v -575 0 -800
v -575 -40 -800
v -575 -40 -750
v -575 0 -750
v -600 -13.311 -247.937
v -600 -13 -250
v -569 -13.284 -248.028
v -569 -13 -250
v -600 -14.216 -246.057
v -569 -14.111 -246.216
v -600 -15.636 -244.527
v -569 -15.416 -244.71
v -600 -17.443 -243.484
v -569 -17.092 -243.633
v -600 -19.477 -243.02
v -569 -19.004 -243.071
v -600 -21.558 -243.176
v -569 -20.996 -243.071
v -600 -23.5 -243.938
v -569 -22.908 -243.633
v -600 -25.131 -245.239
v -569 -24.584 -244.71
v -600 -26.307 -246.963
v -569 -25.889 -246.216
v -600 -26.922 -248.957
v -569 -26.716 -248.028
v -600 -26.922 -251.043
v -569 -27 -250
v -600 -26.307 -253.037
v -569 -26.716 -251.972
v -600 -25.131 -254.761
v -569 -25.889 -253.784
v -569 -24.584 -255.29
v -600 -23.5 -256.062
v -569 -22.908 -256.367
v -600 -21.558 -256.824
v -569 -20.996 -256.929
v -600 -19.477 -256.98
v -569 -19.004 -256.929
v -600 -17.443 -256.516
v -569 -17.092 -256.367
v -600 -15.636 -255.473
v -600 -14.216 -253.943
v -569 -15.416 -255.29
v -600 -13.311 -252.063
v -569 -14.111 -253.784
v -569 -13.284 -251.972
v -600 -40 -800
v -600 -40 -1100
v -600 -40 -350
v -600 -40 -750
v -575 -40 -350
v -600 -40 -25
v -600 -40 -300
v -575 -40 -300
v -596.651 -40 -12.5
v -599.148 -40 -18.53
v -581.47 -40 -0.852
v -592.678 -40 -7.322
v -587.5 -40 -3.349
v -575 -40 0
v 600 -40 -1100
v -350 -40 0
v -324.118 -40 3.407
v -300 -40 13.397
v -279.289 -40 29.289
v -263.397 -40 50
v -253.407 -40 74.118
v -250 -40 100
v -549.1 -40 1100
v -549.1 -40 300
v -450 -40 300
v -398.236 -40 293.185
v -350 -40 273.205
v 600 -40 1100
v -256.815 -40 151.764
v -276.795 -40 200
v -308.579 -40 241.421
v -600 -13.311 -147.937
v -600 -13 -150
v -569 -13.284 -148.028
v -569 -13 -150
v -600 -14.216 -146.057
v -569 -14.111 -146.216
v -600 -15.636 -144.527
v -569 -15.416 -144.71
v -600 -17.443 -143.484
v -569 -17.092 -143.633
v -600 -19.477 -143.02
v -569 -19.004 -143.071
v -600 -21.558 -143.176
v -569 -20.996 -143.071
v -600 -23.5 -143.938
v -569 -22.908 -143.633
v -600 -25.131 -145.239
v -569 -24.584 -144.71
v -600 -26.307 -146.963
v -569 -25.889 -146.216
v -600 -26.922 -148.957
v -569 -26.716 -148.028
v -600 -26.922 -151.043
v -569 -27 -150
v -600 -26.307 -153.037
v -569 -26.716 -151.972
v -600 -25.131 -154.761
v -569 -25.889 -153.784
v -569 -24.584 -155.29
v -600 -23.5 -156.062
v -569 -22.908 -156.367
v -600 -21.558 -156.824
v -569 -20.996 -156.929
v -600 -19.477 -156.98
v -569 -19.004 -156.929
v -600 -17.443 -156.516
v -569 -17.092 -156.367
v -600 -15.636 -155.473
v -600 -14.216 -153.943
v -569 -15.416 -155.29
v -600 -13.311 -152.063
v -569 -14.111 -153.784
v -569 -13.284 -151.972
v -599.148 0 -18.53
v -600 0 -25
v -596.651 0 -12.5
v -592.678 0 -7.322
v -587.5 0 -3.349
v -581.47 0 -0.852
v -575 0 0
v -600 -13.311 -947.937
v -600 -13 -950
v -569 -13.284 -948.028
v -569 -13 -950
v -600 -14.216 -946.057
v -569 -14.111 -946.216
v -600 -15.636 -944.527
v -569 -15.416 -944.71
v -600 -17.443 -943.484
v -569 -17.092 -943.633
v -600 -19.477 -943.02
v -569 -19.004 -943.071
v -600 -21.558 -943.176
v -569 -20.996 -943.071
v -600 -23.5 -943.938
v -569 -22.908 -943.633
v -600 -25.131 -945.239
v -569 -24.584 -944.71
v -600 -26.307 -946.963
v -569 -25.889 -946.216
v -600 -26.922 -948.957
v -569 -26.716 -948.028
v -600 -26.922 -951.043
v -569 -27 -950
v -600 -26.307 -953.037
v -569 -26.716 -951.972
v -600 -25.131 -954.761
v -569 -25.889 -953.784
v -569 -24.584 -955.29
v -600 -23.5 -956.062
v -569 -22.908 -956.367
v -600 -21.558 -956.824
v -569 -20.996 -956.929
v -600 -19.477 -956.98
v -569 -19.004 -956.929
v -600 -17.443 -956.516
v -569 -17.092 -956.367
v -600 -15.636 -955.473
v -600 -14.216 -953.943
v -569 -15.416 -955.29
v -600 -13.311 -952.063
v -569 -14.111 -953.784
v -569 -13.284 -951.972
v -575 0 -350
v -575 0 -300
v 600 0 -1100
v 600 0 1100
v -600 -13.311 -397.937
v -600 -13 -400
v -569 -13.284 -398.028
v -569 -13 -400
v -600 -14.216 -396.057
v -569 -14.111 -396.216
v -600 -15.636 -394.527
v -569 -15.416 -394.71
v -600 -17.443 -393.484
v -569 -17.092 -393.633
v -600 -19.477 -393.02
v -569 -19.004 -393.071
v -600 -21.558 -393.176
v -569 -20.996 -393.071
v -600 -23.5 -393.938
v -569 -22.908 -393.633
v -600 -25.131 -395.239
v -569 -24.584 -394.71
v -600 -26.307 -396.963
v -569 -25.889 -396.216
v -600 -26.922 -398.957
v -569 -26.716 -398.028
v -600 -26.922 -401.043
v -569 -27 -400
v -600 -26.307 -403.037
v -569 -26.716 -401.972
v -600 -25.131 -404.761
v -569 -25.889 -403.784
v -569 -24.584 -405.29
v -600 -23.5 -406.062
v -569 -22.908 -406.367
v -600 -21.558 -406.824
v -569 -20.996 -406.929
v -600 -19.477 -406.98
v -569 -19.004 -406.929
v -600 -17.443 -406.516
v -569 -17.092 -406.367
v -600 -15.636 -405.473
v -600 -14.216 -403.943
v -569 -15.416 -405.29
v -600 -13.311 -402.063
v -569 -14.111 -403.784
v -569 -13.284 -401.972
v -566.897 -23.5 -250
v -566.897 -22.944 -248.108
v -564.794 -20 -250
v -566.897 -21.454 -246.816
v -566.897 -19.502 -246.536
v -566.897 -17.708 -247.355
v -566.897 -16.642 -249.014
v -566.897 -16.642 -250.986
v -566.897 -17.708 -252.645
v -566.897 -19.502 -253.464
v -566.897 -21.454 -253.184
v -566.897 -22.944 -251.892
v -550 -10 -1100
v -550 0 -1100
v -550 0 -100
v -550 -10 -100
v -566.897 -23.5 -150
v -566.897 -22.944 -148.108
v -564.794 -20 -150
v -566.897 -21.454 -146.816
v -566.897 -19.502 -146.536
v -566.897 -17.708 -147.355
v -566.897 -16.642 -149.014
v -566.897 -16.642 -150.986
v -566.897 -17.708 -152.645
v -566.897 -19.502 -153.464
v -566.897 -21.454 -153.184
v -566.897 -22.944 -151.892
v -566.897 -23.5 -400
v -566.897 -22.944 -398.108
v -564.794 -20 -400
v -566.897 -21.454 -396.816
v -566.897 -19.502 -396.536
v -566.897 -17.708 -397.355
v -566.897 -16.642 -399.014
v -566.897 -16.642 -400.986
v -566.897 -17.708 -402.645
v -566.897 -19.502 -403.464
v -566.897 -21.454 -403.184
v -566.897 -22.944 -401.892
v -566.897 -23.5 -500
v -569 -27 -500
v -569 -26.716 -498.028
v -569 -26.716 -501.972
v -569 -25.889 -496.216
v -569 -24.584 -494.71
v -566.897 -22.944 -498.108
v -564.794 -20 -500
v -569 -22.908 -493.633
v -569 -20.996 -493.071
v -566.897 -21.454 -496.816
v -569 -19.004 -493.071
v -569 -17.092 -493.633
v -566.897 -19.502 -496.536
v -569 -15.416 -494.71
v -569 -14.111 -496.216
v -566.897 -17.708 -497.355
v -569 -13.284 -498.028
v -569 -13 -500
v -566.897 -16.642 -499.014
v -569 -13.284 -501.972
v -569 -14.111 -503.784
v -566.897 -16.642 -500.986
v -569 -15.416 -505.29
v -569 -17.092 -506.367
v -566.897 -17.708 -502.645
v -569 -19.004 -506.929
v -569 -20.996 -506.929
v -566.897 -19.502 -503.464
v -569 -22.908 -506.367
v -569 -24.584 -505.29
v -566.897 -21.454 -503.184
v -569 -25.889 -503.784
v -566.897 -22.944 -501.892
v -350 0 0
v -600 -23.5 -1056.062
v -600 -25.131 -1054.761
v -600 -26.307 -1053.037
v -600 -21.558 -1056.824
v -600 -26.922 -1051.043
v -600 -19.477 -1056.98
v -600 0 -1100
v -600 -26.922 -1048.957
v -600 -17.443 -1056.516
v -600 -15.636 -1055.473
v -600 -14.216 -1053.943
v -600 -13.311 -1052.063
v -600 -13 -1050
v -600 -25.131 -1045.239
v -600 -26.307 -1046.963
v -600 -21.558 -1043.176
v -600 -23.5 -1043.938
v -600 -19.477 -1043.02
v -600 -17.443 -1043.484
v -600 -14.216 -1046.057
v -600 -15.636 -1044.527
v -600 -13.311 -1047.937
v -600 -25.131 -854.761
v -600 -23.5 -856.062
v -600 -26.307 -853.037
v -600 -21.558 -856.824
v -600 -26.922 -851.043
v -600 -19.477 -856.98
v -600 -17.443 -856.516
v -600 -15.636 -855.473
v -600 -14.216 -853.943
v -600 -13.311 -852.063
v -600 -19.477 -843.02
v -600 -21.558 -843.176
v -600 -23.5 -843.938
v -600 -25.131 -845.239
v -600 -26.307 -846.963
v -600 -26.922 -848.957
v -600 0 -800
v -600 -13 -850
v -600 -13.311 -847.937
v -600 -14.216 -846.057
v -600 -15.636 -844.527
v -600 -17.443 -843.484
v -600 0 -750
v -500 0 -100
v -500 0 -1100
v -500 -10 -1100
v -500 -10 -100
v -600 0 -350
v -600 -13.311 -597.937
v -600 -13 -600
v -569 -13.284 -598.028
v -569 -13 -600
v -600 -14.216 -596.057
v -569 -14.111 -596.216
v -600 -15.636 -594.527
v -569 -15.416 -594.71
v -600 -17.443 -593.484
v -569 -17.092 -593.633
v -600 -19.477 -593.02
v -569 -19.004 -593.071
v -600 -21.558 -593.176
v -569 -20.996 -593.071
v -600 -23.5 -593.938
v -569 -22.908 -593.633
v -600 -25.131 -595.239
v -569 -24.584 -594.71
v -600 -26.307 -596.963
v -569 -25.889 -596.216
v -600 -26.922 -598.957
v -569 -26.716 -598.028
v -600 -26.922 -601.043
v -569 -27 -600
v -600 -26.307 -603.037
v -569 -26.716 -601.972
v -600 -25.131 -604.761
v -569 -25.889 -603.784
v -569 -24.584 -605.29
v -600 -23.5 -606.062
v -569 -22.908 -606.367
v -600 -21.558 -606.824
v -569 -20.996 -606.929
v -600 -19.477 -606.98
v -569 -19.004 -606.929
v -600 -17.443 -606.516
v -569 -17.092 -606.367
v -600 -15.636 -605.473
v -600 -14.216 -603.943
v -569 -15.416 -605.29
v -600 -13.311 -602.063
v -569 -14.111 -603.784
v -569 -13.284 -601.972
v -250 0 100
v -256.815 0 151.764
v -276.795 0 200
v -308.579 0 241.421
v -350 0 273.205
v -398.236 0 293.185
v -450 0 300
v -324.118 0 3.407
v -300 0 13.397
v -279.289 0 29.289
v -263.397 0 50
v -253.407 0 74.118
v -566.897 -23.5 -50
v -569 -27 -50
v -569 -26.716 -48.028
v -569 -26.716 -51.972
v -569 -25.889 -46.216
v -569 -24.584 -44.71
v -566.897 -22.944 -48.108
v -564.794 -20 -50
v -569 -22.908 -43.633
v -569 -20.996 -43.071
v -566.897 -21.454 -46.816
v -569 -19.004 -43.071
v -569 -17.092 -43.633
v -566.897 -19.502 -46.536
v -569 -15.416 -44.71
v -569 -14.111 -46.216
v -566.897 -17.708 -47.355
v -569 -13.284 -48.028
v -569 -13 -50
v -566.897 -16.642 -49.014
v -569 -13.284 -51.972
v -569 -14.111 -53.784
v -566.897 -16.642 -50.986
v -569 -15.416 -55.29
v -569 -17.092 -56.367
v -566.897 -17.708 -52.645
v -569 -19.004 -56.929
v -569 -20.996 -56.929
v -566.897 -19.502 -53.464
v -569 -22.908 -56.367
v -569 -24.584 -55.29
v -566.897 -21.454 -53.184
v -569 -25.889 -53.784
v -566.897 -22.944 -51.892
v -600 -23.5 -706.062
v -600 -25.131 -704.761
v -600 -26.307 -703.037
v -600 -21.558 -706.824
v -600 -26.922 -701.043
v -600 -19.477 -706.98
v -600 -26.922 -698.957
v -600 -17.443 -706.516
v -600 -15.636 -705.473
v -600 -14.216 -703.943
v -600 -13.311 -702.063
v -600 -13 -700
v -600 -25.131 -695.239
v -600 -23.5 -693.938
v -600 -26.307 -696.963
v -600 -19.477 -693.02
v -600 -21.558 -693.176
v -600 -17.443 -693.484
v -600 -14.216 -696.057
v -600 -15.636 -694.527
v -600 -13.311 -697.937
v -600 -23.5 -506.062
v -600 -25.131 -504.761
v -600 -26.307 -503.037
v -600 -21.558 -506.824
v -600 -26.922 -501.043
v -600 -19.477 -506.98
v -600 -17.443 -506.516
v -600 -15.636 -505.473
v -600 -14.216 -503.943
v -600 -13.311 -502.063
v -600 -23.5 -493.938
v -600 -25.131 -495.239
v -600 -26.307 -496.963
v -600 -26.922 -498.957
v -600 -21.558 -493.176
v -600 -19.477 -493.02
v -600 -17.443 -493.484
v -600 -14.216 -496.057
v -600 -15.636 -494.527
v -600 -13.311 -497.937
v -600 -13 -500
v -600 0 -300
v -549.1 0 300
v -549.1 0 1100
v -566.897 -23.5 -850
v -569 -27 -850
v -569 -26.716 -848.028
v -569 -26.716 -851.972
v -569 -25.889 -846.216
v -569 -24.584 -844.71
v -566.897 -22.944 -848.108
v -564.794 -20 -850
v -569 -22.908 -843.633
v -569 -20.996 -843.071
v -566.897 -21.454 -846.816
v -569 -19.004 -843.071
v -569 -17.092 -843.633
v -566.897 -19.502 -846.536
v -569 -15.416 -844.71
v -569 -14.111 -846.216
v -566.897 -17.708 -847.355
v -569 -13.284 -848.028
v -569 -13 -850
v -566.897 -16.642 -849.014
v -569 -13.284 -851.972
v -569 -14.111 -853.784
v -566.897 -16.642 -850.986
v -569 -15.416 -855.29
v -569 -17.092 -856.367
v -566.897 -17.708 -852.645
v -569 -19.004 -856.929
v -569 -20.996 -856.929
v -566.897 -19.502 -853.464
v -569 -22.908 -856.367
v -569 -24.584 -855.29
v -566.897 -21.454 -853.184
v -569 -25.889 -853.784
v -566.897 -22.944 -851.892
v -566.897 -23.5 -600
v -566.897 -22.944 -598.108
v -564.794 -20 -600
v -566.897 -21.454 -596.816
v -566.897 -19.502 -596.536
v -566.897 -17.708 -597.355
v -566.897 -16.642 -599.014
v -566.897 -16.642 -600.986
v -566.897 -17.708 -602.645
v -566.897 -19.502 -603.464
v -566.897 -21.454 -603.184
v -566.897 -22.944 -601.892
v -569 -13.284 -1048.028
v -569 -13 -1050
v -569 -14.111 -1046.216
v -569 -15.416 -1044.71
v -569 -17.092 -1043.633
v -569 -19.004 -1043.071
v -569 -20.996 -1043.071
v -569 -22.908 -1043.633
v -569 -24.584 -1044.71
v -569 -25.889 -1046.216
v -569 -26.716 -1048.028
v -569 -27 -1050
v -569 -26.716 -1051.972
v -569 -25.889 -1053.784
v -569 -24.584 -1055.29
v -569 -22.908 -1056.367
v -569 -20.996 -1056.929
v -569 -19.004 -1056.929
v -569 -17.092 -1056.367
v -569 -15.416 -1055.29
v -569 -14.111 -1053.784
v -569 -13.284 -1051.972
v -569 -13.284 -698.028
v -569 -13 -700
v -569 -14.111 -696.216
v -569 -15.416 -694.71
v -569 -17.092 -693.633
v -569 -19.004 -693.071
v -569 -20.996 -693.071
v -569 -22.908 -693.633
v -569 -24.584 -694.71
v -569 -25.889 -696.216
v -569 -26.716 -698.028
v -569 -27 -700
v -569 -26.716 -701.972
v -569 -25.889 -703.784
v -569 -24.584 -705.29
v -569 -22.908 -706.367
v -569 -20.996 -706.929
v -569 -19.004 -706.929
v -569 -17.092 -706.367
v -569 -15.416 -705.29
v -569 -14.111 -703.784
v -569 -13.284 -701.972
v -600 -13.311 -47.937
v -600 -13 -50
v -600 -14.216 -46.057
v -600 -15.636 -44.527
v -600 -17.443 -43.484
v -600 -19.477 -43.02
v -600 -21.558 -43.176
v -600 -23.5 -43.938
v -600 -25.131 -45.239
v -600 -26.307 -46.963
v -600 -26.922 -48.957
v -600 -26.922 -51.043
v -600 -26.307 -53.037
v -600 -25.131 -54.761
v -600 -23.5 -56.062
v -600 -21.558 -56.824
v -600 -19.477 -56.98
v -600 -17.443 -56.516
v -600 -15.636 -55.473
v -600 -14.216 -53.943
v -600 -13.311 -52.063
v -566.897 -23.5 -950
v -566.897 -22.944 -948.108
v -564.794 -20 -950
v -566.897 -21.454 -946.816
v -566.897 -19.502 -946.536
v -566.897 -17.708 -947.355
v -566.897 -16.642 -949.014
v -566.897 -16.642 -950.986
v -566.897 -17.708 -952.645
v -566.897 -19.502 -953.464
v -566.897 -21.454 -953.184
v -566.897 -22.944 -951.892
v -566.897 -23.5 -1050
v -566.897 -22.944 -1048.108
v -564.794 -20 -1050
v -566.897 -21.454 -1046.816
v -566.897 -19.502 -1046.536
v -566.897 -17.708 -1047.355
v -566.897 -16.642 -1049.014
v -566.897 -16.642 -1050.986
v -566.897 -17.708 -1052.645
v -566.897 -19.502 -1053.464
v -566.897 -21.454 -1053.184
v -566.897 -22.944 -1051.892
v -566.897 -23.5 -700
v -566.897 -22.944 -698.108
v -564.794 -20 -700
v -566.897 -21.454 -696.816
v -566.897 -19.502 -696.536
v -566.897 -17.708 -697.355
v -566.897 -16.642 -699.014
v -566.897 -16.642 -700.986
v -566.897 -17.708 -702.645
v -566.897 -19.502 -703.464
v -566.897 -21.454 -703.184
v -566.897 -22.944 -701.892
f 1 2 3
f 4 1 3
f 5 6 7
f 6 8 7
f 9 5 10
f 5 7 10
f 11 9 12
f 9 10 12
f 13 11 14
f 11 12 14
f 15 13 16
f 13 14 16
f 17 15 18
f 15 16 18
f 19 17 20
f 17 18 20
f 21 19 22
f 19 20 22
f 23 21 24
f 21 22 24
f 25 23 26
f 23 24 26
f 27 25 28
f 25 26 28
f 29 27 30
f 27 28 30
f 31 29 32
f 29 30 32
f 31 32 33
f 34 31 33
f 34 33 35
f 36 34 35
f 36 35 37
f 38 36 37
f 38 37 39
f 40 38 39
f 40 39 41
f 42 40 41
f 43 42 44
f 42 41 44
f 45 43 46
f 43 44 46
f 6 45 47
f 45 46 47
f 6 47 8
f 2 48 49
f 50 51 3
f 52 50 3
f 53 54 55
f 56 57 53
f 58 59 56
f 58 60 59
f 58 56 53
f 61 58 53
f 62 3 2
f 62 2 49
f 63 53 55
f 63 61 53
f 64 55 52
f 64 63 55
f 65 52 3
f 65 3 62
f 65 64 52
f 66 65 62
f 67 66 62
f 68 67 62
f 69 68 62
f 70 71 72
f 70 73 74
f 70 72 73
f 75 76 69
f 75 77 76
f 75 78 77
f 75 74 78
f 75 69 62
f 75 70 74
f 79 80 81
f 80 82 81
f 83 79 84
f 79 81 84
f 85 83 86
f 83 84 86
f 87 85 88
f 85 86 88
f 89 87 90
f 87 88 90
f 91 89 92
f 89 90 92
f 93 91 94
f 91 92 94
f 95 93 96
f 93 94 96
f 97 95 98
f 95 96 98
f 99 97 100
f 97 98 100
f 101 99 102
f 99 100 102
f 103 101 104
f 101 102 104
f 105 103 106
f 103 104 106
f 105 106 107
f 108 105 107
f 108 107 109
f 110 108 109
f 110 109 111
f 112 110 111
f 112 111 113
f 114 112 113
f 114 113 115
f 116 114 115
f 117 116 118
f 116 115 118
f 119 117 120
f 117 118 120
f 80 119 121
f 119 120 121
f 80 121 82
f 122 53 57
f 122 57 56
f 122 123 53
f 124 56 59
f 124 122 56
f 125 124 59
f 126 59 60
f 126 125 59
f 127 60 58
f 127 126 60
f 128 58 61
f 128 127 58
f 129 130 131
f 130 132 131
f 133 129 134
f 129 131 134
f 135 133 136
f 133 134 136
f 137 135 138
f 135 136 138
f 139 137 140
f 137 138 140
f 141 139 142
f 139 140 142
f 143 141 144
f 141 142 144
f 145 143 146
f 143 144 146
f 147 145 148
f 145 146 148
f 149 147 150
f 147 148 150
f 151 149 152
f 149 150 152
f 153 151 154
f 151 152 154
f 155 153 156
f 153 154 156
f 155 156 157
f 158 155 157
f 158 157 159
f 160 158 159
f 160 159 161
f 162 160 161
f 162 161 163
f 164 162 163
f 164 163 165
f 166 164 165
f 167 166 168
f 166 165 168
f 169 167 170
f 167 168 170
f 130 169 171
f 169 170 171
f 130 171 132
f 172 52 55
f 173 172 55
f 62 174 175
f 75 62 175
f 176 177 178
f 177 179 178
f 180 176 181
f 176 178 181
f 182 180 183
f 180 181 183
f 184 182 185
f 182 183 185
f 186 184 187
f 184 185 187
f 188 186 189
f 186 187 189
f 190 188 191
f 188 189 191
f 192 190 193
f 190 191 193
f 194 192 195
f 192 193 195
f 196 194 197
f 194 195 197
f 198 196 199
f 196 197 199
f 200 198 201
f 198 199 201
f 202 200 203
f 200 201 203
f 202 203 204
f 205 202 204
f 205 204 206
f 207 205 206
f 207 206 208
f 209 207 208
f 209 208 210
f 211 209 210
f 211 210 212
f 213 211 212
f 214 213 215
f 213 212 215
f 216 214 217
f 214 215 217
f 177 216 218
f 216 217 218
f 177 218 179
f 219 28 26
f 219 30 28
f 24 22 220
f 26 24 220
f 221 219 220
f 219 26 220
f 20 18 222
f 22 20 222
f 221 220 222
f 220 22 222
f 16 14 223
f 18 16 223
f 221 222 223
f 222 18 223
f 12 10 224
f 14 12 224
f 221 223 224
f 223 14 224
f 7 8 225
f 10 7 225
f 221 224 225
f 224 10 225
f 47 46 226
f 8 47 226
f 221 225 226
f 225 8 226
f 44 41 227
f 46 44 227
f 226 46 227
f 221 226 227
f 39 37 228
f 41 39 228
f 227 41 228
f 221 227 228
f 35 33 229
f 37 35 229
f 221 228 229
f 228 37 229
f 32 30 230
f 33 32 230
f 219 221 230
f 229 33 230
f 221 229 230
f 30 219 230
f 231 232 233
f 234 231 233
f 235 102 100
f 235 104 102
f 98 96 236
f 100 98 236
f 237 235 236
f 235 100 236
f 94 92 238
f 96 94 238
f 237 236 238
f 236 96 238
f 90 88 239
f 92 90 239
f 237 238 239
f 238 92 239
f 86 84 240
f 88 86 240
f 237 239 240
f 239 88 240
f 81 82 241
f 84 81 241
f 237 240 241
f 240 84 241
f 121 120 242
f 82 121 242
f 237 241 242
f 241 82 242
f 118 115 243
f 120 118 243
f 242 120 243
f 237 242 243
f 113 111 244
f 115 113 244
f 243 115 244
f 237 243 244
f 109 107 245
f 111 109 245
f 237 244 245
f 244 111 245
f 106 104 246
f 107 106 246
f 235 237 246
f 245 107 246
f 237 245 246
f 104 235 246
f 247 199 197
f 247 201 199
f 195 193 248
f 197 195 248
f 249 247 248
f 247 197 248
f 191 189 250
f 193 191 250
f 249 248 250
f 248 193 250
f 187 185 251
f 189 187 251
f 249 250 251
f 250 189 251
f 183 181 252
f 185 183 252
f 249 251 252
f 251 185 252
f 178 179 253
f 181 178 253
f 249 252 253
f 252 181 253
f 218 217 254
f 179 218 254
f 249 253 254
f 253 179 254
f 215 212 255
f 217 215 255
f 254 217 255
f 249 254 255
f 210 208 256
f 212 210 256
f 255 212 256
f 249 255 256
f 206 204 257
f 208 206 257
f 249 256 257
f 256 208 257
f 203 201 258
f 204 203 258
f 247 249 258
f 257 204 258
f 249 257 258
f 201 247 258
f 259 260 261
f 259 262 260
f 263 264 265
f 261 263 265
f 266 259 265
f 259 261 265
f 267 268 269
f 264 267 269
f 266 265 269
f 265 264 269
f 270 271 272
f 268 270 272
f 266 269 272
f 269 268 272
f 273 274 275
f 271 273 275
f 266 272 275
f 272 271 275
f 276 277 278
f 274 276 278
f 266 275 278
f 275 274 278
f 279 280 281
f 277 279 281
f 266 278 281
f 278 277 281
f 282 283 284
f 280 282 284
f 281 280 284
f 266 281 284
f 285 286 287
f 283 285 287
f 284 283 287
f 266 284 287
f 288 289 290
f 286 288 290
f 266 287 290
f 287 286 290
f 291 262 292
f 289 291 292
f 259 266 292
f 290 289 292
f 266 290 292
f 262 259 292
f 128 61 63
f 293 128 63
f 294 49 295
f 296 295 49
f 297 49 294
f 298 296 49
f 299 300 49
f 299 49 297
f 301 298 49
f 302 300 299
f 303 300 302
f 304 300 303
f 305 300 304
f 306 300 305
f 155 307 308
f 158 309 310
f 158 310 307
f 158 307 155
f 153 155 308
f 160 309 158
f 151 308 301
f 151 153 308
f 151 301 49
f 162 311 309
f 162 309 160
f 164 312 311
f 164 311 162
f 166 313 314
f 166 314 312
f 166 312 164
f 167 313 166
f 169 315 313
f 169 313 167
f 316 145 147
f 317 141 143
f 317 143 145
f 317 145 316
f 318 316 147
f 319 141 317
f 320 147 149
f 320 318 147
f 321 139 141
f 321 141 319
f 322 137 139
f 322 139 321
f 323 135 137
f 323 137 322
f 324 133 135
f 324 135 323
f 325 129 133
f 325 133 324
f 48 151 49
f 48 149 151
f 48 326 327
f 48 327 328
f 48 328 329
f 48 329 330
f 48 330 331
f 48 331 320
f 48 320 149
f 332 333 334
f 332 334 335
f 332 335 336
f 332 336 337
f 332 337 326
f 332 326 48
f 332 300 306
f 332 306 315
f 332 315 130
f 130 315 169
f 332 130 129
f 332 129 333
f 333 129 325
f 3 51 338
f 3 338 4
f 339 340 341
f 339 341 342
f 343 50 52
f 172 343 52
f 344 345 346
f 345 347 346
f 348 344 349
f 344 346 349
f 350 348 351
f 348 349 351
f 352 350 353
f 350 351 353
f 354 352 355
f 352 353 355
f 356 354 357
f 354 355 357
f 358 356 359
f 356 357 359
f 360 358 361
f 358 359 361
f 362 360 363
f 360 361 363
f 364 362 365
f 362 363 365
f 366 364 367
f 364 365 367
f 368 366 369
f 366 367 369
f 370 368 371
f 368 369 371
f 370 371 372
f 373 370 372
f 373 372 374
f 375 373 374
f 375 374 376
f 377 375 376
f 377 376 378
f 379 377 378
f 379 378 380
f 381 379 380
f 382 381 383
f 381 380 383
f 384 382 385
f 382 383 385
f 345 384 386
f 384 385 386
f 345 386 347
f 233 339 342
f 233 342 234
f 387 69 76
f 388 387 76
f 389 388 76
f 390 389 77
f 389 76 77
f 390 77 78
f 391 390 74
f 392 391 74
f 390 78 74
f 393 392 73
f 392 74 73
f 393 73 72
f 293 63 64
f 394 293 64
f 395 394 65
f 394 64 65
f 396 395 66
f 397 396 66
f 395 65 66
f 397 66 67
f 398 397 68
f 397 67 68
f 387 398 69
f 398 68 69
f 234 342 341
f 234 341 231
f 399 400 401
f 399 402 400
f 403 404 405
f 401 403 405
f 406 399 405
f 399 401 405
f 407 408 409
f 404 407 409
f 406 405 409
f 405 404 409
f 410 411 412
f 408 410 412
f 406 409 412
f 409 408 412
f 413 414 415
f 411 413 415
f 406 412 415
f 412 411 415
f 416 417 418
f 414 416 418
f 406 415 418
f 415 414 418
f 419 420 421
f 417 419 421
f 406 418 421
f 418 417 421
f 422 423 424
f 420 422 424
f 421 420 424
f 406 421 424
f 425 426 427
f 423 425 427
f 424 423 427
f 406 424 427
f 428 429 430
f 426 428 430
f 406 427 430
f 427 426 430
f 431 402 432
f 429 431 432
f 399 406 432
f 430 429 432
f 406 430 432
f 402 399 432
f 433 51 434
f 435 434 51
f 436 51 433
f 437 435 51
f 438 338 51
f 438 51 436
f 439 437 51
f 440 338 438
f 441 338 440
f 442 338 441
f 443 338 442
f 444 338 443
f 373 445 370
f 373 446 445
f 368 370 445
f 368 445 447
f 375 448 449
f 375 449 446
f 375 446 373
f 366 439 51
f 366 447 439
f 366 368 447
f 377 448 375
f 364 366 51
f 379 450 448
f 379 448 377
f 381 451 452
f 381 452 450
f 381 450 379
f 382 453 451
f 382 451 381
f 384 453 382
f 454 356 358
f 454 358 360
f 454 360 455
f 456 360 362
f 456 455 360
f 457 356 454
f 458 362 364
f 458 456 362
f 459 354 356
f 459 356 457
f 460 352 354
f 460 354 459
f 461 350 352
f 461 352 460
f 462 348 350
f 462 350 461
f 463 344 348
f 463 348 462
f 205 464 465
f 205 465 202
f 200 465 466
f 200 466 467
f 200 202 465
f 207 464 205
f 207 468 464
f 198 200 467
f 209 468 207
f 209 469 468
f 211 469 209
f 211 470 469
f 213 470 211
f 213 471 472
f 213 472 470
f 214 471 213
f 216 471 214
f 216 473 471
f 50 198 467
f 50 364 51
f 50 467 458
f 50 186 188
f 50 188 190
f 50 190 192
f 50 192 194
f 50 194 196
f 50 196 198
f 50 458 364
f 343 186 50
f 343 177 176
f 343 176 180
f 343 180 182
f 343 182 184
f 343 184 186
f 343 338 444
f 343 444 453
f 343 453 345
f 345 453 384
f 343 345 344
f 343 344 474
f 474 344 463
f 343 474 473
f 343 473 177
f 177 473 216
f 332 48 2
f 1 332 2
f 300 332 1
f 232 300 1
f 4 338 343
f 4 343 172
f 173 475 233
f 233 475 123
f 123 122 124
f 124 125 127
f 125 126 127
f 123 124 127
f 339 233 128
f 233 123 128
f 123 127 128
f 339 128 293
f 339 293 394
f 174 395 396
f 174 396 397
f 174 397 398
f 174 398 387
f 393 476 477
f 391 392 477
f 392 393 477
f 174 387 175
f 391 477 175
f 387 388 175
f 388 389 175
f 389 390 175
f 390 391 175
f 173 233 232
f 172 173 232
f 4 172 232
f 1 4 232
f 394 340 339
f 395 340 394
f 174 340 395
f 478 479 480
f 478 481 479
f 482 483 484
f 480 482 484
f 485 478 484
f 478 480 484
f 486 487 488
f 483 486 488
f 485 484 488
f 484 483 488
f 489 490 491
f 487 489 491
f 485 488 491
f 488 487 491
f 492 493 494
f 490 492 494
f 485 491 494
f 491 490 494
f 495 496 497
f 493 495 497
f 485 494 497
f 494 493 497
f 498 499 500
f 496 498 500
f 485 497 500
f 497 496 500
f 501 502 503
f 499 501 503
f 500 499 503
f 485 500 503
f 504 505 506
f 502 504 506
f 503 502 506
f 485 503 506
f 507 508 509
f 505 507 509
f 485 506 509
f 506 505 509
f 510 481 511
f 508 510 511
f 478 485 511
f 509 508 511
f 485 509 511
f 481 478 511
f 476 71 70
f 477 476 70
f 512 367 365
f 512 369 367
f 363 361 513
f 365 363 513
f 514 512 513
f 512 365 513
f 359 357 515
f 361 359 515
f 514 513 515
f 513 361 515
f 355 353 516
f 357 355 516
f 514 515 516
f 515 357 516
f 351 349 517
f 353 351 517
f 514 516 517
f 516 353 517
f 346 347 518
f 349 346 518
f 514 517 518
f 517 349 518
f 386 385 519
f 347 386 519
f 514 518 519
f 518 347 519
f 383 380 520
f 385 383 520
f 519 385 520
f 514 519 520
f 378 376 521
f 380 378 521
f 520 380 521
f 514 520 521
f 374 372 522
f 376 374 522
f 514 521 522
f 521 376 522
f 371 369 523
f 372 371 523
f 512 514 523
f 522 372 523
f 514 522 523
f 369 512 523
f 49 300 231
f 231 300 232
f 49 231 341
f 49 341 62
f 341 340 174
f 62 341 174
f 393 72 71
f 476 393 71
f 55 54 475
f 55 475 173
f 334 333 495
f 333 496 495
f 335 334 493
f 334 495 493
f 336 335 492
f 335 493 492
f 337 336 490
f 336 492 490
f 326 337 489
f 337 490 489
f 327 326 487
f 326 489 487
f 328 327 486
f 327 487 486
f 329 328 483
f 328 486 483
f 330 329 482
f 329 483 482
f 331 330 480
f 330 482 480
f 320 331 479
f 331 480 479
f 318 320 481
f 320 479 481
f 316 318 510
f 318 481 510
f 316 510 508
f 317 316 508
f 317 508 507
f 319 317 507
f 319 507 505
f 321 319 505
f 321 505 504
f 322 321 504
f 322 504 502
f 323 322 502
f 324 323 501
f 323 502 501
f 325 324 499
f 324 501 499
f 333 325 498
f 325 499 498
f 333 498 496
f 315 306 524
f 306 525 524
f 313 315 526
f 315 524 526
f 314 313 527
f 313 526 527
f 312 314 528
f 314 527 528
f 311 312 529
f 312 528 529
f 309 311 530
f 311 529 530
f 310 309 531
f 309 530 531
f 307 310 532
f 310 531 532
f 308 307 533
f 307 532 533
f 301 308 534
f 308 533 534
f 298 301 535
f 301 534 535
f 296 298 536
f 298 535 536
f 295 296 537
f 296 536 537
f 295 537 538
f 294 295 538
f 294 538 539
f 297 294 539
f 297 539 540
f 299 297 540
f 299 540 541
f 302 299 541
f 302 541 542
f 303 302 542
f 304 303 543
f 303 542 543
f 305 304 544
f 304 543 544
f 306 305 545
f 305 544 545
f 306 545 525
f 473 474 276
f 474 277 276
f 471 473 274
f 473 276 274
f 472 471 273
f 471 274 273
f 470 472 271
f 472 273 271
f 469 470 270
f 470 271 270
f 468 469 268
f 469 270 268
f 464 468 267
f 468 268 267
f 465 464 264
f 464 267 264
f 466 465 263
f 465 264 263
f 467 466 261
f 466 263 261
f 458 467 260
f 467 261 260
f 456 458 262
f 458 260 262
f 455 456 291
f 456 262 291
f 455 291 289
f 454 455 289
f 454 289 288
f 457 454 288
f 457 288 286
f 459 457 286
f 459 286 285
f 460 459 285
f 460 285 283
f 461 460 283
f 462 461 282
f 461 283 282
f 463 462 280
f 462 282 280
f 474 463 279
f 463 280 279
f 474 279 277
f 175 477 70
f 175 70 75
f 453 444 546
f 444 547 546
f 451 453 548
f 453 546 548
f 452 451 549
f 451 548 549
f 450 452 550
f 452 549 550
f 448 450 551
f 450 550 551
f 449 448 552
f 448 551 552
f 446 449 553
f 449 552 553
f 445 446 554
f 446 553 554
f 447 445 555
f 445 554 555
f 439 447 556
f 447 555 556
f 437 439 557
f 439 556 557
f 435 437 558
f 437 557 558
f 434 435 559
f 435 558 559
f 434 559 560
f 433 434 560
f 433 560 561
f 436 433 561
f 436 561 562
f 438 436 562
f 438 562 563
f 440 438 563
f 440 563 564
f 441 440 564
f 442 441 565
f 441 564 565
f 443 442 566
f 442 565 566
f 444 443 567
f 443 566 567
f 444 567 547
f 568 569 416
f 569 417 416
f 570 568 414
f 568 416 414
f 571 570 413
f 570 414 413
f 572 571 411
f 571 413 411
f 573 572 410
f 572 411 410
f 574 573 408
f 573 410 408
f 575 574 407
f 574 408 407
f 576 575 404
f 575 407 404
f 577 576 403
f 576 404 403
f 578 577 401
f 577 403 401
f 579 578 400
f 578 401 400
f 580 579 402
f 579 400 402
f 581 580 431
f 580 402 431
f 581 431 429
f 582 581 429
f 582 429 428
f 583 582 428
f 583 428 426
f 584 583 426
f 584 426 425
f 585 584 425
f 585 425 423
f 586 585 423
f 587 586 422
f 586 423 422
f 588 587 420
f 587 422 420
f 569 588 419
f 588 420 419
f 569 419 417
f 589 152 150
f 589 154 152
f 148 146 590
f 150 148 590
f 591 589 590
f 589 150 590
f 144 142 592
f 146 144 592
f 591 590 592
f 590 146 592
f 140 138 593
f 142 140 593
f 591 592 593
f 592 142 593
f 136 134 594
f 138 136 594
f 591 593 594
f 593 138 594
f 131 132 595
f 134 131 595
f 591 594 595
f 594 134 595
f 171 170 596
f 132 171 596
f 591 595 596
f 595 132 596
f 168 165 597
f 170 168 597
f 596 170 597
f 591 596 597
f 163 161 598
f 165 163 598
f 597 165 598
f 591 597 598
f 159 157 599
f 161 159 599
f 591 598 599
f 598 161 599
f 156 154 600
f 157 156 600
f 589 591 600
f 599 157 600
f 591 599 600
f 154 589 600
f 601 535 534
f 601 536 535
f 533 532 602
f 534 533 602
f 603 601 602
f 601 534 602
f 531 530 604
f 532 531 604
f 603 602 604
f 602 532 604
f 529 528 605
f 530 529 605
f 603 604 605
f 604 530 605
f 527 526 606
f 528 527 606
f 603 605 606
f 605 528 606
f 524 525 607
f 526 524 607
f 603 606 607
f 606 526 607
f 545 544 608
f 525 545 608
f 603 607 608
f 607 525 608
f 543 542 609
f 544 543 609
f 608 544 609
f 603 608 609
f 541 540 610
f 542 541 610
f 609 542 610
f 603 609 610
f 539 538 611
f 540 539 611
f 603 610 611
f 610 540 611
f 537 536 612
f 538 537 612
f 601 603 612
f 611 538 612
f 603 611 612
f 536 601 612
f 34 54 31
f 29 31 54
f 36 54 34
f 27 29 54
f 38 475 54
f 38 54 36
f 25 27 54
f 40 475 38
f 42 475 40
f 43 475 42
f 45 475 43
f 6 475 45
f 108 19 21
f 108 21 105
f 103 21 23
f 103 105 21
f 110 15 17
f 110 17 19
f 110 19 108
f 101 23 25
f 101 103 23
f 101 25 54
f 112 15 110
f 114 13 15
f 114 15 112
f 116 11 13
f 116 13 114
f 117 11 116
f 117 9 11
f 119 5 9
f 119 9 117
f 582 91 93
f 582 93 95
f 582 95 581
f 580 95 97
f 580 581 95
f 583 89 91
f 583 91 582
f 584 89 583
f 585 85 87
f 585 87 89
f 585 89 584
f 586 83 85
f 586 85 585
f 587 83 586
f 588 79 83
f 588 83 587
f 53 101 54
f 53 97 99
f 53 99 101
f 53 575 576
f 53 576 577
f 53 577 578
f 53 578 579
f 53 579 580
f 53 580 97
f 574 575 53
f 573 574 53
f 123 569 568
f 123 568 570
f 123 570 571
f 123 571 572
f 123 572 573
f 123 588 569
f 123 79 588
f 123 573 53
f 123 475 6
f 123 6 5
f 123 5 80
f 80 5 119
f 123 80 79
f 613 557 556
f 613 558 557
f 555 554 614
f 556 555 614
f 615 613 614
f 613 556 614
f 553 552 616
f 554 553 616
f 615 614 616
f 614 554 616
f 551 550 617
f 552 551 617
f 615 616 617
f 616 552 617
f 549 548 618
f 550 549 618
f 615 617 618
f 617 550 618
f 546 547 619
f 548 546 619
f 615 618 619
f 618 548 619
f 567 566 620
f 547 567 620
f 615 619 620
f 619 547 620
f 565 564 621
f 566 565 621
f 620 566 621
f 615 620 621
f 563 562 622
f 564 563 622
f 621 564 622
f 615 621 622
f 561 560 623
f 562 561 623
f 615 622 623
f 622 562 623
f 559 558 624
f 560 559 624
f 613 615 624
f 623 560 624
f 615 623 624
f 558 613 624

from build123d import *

# Parameters (mm, degrees)
F0_W      = 1200
F0_H      = 2200
F1_DEPTH  = 40
F2_W      = 50
F2_H      = 1000
F3_DEPTH  = 10
F5_DEPTH  = 40.001
F6_R      = 25
F8_DEPTH  = 40.001
F9_W      = 25
F9_H      = 50
F10_DEPTH = 40.001
F12_D     = 14
F12_DEPTH = 31
F12_TIP   = 4.2060243332


with BuildPart() as f1:
    # F0 (on Front) → F1 (new body)
    with BuildSketch(Plane.XZ):
        Rectangle(F0_W, F0_H)
    extrude(amount=F1_DEPTH)

    # F2 (on face) → F3 (cut)
    with BuildSketch(Plane(origin=(0, 0, 0), x_dir=(-1, 0, 0), z_dir=(0, 1, 0))):
        with Locations((525, -600)):
            Rectangle(F2_W, F2_H)
    extrude(amount=-F3_DEPTH, mode=Mode.SUBTRACT)

    # F4 (on face) → F5 (cut, through all)
    with BuildSketch(Plane.XZ.offset(40)):
        with BuildLine():
            Line((-600, 300), (-600, 0))
            Line((-600, 0), (-350, 0))
            ThreePointArc((-350, 0), (-279.2893218813, 29.2893218813), (-250, 100))
            ThreePointArc((-250, 100), (-308.5786437627, 241.4213562373), (-450, 300))
            Line((-450, 300), (-600, 300))
        make_face()
    extrude(amount=-F5_DEPTH, mode=Mode.SUBTRACT)

    # F6
    f6_edges = [f1.edges().sort_by_distance(p)[0] for p in [
        (-600, -20, 300),
        (-600, -20, 0),
    ]]
    fillet(f6_edges, radius=F6_R)

    # F7 (on face) → F8 (cut, through all)
    with BuildSketch(Plane.XZ.offset(40)):
        with BuildLine():
            Line((-549.1, 1100), (-600, 1100))
            Line((-600, 1100), (-600, 325))
            ThreePointArc((-600, 325), (-592.6776695297, 307.3223304703), (-575, 300))
            Line((-575, 300), (-549.1, 300))
            Line((-549.1, 300), (-549.1, 1100))
        make_face()
    extrude(amount=-F8_DEPTH, mode=Mode.SUBTRACT)

    # F9 (on face) → F10 (cut, through all)
    with BuildSketch(Plane.XZ.offset(40)):
        with Locations((-587.5, -325)):
            Rectangle(F9_W, F9_H)
        with Locations((-587.5, -775)):
            Rectangle(F9_W, F9_H)
    extrude(amount=-F10_DEPTH, mode=Mode.SUBTRACT)

    # F12
    with Locations(Plane(origin=(-600, 0, 0), x_dir=(0, -1, 0), z_dir=(-1, 0, 0))):
        with Locations((20, -1050), (20, -950), (20, -850), (20, -700), (20, -600), (20, -500), (20, -400), (20, -250), (20, -150), (20, -50)):
            Hole(F12_D / 2, depth=F12_DEPTH)
            with Locations((0, 0, -(F12_DEPTH + F12_TIP / 2))):  # 118° drill point
                Cone(0, F12_D / 2, F12_TIP, mode=Mode.SUBTRACT)


solid = f1.part
